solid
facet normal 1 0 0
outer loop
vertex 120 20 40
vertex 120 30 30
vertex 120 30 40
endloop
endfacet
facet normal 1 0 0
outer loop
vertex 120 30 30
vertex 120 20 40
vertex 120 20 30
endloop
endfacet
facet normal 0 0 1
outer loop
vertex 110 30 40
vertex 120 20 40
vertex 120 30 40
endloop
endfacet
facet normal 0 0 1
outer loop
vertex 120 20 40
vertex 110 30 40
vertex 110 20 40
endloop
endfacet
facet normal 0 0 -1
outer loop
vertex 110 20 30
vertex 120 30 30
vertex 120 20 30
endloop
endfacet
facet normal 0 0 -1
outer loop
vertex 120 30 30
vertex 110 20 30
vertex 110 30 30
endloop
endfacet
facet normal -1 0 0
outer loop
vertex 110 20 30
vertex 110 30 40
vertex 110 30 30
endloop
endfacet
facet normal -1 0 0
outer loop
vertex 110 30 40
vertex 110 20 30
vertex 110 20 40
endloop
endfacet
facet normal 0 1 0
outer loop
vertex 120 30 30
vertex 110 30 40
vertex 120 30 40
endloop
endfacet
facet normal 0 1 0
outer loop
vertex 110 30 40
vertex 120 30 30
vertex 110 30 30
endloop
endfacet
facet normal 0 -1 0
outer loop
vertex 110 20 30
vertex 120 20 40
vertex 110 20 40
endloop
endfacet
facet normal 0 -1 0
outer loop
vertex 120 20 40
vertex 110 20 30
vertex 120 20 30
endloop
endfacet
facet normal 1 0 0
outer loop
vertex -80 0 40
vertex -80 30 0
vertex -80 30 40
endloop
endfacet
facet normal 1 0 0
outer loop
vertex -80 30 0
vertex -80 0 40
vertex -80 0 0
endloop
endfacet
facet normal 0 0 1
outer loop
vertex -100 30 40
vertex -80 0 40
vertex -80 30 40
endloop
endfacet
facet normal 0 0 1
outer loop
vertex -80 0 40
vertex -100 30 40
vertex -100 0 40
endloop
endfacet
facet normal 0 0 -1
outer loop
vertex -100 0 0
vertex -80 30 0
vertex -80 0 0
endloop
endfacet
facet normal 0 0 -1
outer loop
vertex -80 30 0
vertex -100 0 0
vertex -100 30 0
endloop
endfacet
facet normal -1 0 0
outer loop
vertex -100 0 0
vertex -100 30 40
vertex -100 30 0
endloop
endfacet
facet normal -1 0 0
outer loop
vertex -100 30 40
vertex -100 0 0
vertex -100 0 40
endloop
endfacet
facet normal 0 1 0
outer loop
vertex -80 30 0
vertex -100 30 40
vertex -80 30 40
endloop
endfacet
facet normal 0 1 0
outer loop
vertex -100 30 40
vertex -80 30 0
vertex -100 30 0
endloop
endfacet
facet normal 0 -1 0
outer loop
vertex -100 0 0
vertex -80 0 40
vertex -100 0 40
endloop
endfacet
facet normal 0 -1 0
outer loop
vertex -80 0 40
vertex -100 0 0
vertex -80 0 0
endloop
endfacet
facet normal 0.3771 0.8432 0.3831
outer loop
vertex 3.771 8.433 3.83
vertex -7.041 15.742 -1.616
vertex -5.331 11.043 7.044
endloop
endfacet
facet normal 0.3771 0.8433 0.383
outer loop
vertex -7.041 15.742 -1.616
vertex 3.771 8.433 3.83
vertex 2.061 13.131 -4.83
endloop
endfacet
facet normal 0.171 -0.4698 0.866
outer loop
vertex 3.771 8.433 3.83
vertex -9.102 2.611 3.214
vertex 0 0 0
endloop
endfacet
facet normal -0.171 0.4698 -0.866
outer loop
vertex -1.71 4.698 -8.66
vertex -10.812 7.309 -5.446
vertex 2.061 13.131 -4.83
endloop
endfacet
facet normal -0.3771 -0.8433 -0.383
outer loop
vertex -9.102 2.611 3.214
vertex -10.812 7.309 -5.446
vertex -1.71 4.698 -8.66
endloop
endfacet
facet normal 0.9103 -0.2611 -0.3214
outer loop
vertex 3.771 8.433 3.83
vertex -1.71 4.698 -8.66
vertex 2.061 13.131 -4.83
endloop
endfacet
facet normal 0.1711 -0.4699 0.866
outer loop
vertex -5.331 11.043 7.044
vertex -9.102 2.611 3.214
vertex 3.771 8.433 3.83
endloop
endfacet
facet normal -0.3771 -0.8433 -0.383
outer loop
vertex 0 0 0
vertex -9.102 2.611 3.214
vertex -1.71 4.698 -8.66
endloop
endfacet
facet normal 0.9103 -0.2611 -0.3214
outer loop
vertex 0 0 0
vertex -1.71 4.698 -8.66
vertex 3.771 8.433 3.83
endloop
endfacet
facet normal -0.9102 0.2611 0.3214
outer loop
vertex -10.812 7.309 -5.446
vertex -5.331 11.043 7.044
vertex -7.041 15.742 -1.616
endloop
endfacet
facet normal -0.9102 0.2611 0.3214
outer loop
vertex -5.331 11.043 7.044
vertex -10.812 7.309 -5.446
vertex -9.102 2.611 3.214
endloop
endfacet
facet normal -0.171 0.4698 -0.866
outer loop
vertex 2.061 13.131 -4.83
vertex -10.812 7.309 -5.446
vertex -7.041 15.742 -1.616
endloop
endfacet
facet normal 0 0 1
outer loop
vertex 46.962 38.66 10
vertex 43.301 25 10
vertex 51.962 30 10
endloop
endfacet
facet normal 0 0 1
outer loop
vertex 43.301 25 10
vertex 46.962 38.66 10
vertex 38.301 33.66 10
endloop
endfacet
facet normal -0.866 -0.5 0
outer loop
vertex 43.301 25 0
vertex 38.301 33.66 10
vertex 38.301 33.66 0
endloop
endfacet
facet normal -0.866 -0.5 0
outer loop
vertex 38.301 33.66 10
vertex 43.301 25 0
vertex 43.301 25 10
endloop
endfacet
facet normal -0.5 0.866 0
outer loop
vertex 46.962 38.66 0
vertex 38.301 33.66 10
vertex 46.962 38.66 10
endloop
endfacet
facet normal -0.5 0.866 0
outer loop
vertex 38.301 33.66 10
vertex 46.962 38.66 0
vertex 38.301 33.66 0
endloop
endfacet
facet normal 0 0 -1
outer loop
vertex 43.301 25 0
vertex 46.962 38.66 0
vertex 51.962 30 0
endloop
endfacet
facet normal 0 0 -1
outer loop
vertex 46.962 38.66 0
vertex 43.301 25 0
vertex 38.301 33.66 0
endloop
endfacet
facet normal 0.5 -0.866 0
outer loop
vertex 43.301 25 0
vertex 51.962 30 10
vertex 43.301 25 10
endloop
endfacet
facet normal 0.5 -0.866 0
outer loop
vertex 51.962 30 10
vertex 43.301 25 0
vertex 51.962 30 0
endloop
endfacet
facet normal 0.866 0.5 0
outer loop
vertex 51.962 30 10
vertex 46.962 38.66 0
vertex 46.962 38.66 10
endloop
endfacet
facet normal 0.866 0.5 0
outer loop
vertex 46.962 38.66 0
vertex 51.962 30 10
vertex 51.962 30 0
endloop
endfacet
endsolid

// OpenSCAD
// file: tr.scad
function r(x=0,y=0,z=0) = [
  [cos(z)*cos(y), cos(z)*sin(y)*sin(x)-sin(z)*cos(x), cos(z)*sin(y)*cos(x)+sin(z)*sin(x), 0],
  [sin(z)*cos(y), sin(z)*sin(y)*sin(x)+cos(z)*cos(x), sin(z)*sin(y)*cos(x)-cos(z)*sin(x), 0],
  [-sin(y),       cos(y)*sin(x),                      cos(y)*cos(x),                      0],
  [0,             0,                                  0,                                  1],
];

function rx(x) = r(x=x);
function ry(y) = r(y=y);
function rz(z) = r(z=z);

function t(x=0,y=0,z=0) = [
  [1,0,0,x],
  [0,1,0,y],
  [0,0,1,z],
  [0,0,0,1],
];

function tx(x) = t(x=x);
function ty(y) = t(y=y);
function tz(z) = t(z=z);

function s(x=1, y=1, z=1) = [
  [x,0,0,0],
  [0,y,0,0],
  [0,0,z,0],
  [0,0,0,1],
];

function sx(x) = s(x=x);
function sy(y) = s(y=y);
function sz(z) = s(z=z);

module tr(m) {
  multmatrix(m) children();
}

function d2(p) = [p.x, p.y];
function d3(p) = [p.x, p.y, len(p) > 2 ? p.z : 0];
function d4(p) = [p.x, p.y, len(p) > 2 ? p.z : 0, 1];
// main file
use <tr.scad>

multmatrix(r(40,60,110))cube(10);
#rotate([40,60,110])cube(10);

translate([100,0,0]){
  multmatrix(t(10,20,30))cube(10);
  #translate([10,20,30])cube(10);
}

translate([-100,0,0]){
  multmatrix(s(2,3,4))cube(10);
  #scale([2,3,4])cube(10);
}

multmatrix(rz(30)*tx(50))cube(10);
#rotate([0,0,30])translate([50,0,0])cube(10);
